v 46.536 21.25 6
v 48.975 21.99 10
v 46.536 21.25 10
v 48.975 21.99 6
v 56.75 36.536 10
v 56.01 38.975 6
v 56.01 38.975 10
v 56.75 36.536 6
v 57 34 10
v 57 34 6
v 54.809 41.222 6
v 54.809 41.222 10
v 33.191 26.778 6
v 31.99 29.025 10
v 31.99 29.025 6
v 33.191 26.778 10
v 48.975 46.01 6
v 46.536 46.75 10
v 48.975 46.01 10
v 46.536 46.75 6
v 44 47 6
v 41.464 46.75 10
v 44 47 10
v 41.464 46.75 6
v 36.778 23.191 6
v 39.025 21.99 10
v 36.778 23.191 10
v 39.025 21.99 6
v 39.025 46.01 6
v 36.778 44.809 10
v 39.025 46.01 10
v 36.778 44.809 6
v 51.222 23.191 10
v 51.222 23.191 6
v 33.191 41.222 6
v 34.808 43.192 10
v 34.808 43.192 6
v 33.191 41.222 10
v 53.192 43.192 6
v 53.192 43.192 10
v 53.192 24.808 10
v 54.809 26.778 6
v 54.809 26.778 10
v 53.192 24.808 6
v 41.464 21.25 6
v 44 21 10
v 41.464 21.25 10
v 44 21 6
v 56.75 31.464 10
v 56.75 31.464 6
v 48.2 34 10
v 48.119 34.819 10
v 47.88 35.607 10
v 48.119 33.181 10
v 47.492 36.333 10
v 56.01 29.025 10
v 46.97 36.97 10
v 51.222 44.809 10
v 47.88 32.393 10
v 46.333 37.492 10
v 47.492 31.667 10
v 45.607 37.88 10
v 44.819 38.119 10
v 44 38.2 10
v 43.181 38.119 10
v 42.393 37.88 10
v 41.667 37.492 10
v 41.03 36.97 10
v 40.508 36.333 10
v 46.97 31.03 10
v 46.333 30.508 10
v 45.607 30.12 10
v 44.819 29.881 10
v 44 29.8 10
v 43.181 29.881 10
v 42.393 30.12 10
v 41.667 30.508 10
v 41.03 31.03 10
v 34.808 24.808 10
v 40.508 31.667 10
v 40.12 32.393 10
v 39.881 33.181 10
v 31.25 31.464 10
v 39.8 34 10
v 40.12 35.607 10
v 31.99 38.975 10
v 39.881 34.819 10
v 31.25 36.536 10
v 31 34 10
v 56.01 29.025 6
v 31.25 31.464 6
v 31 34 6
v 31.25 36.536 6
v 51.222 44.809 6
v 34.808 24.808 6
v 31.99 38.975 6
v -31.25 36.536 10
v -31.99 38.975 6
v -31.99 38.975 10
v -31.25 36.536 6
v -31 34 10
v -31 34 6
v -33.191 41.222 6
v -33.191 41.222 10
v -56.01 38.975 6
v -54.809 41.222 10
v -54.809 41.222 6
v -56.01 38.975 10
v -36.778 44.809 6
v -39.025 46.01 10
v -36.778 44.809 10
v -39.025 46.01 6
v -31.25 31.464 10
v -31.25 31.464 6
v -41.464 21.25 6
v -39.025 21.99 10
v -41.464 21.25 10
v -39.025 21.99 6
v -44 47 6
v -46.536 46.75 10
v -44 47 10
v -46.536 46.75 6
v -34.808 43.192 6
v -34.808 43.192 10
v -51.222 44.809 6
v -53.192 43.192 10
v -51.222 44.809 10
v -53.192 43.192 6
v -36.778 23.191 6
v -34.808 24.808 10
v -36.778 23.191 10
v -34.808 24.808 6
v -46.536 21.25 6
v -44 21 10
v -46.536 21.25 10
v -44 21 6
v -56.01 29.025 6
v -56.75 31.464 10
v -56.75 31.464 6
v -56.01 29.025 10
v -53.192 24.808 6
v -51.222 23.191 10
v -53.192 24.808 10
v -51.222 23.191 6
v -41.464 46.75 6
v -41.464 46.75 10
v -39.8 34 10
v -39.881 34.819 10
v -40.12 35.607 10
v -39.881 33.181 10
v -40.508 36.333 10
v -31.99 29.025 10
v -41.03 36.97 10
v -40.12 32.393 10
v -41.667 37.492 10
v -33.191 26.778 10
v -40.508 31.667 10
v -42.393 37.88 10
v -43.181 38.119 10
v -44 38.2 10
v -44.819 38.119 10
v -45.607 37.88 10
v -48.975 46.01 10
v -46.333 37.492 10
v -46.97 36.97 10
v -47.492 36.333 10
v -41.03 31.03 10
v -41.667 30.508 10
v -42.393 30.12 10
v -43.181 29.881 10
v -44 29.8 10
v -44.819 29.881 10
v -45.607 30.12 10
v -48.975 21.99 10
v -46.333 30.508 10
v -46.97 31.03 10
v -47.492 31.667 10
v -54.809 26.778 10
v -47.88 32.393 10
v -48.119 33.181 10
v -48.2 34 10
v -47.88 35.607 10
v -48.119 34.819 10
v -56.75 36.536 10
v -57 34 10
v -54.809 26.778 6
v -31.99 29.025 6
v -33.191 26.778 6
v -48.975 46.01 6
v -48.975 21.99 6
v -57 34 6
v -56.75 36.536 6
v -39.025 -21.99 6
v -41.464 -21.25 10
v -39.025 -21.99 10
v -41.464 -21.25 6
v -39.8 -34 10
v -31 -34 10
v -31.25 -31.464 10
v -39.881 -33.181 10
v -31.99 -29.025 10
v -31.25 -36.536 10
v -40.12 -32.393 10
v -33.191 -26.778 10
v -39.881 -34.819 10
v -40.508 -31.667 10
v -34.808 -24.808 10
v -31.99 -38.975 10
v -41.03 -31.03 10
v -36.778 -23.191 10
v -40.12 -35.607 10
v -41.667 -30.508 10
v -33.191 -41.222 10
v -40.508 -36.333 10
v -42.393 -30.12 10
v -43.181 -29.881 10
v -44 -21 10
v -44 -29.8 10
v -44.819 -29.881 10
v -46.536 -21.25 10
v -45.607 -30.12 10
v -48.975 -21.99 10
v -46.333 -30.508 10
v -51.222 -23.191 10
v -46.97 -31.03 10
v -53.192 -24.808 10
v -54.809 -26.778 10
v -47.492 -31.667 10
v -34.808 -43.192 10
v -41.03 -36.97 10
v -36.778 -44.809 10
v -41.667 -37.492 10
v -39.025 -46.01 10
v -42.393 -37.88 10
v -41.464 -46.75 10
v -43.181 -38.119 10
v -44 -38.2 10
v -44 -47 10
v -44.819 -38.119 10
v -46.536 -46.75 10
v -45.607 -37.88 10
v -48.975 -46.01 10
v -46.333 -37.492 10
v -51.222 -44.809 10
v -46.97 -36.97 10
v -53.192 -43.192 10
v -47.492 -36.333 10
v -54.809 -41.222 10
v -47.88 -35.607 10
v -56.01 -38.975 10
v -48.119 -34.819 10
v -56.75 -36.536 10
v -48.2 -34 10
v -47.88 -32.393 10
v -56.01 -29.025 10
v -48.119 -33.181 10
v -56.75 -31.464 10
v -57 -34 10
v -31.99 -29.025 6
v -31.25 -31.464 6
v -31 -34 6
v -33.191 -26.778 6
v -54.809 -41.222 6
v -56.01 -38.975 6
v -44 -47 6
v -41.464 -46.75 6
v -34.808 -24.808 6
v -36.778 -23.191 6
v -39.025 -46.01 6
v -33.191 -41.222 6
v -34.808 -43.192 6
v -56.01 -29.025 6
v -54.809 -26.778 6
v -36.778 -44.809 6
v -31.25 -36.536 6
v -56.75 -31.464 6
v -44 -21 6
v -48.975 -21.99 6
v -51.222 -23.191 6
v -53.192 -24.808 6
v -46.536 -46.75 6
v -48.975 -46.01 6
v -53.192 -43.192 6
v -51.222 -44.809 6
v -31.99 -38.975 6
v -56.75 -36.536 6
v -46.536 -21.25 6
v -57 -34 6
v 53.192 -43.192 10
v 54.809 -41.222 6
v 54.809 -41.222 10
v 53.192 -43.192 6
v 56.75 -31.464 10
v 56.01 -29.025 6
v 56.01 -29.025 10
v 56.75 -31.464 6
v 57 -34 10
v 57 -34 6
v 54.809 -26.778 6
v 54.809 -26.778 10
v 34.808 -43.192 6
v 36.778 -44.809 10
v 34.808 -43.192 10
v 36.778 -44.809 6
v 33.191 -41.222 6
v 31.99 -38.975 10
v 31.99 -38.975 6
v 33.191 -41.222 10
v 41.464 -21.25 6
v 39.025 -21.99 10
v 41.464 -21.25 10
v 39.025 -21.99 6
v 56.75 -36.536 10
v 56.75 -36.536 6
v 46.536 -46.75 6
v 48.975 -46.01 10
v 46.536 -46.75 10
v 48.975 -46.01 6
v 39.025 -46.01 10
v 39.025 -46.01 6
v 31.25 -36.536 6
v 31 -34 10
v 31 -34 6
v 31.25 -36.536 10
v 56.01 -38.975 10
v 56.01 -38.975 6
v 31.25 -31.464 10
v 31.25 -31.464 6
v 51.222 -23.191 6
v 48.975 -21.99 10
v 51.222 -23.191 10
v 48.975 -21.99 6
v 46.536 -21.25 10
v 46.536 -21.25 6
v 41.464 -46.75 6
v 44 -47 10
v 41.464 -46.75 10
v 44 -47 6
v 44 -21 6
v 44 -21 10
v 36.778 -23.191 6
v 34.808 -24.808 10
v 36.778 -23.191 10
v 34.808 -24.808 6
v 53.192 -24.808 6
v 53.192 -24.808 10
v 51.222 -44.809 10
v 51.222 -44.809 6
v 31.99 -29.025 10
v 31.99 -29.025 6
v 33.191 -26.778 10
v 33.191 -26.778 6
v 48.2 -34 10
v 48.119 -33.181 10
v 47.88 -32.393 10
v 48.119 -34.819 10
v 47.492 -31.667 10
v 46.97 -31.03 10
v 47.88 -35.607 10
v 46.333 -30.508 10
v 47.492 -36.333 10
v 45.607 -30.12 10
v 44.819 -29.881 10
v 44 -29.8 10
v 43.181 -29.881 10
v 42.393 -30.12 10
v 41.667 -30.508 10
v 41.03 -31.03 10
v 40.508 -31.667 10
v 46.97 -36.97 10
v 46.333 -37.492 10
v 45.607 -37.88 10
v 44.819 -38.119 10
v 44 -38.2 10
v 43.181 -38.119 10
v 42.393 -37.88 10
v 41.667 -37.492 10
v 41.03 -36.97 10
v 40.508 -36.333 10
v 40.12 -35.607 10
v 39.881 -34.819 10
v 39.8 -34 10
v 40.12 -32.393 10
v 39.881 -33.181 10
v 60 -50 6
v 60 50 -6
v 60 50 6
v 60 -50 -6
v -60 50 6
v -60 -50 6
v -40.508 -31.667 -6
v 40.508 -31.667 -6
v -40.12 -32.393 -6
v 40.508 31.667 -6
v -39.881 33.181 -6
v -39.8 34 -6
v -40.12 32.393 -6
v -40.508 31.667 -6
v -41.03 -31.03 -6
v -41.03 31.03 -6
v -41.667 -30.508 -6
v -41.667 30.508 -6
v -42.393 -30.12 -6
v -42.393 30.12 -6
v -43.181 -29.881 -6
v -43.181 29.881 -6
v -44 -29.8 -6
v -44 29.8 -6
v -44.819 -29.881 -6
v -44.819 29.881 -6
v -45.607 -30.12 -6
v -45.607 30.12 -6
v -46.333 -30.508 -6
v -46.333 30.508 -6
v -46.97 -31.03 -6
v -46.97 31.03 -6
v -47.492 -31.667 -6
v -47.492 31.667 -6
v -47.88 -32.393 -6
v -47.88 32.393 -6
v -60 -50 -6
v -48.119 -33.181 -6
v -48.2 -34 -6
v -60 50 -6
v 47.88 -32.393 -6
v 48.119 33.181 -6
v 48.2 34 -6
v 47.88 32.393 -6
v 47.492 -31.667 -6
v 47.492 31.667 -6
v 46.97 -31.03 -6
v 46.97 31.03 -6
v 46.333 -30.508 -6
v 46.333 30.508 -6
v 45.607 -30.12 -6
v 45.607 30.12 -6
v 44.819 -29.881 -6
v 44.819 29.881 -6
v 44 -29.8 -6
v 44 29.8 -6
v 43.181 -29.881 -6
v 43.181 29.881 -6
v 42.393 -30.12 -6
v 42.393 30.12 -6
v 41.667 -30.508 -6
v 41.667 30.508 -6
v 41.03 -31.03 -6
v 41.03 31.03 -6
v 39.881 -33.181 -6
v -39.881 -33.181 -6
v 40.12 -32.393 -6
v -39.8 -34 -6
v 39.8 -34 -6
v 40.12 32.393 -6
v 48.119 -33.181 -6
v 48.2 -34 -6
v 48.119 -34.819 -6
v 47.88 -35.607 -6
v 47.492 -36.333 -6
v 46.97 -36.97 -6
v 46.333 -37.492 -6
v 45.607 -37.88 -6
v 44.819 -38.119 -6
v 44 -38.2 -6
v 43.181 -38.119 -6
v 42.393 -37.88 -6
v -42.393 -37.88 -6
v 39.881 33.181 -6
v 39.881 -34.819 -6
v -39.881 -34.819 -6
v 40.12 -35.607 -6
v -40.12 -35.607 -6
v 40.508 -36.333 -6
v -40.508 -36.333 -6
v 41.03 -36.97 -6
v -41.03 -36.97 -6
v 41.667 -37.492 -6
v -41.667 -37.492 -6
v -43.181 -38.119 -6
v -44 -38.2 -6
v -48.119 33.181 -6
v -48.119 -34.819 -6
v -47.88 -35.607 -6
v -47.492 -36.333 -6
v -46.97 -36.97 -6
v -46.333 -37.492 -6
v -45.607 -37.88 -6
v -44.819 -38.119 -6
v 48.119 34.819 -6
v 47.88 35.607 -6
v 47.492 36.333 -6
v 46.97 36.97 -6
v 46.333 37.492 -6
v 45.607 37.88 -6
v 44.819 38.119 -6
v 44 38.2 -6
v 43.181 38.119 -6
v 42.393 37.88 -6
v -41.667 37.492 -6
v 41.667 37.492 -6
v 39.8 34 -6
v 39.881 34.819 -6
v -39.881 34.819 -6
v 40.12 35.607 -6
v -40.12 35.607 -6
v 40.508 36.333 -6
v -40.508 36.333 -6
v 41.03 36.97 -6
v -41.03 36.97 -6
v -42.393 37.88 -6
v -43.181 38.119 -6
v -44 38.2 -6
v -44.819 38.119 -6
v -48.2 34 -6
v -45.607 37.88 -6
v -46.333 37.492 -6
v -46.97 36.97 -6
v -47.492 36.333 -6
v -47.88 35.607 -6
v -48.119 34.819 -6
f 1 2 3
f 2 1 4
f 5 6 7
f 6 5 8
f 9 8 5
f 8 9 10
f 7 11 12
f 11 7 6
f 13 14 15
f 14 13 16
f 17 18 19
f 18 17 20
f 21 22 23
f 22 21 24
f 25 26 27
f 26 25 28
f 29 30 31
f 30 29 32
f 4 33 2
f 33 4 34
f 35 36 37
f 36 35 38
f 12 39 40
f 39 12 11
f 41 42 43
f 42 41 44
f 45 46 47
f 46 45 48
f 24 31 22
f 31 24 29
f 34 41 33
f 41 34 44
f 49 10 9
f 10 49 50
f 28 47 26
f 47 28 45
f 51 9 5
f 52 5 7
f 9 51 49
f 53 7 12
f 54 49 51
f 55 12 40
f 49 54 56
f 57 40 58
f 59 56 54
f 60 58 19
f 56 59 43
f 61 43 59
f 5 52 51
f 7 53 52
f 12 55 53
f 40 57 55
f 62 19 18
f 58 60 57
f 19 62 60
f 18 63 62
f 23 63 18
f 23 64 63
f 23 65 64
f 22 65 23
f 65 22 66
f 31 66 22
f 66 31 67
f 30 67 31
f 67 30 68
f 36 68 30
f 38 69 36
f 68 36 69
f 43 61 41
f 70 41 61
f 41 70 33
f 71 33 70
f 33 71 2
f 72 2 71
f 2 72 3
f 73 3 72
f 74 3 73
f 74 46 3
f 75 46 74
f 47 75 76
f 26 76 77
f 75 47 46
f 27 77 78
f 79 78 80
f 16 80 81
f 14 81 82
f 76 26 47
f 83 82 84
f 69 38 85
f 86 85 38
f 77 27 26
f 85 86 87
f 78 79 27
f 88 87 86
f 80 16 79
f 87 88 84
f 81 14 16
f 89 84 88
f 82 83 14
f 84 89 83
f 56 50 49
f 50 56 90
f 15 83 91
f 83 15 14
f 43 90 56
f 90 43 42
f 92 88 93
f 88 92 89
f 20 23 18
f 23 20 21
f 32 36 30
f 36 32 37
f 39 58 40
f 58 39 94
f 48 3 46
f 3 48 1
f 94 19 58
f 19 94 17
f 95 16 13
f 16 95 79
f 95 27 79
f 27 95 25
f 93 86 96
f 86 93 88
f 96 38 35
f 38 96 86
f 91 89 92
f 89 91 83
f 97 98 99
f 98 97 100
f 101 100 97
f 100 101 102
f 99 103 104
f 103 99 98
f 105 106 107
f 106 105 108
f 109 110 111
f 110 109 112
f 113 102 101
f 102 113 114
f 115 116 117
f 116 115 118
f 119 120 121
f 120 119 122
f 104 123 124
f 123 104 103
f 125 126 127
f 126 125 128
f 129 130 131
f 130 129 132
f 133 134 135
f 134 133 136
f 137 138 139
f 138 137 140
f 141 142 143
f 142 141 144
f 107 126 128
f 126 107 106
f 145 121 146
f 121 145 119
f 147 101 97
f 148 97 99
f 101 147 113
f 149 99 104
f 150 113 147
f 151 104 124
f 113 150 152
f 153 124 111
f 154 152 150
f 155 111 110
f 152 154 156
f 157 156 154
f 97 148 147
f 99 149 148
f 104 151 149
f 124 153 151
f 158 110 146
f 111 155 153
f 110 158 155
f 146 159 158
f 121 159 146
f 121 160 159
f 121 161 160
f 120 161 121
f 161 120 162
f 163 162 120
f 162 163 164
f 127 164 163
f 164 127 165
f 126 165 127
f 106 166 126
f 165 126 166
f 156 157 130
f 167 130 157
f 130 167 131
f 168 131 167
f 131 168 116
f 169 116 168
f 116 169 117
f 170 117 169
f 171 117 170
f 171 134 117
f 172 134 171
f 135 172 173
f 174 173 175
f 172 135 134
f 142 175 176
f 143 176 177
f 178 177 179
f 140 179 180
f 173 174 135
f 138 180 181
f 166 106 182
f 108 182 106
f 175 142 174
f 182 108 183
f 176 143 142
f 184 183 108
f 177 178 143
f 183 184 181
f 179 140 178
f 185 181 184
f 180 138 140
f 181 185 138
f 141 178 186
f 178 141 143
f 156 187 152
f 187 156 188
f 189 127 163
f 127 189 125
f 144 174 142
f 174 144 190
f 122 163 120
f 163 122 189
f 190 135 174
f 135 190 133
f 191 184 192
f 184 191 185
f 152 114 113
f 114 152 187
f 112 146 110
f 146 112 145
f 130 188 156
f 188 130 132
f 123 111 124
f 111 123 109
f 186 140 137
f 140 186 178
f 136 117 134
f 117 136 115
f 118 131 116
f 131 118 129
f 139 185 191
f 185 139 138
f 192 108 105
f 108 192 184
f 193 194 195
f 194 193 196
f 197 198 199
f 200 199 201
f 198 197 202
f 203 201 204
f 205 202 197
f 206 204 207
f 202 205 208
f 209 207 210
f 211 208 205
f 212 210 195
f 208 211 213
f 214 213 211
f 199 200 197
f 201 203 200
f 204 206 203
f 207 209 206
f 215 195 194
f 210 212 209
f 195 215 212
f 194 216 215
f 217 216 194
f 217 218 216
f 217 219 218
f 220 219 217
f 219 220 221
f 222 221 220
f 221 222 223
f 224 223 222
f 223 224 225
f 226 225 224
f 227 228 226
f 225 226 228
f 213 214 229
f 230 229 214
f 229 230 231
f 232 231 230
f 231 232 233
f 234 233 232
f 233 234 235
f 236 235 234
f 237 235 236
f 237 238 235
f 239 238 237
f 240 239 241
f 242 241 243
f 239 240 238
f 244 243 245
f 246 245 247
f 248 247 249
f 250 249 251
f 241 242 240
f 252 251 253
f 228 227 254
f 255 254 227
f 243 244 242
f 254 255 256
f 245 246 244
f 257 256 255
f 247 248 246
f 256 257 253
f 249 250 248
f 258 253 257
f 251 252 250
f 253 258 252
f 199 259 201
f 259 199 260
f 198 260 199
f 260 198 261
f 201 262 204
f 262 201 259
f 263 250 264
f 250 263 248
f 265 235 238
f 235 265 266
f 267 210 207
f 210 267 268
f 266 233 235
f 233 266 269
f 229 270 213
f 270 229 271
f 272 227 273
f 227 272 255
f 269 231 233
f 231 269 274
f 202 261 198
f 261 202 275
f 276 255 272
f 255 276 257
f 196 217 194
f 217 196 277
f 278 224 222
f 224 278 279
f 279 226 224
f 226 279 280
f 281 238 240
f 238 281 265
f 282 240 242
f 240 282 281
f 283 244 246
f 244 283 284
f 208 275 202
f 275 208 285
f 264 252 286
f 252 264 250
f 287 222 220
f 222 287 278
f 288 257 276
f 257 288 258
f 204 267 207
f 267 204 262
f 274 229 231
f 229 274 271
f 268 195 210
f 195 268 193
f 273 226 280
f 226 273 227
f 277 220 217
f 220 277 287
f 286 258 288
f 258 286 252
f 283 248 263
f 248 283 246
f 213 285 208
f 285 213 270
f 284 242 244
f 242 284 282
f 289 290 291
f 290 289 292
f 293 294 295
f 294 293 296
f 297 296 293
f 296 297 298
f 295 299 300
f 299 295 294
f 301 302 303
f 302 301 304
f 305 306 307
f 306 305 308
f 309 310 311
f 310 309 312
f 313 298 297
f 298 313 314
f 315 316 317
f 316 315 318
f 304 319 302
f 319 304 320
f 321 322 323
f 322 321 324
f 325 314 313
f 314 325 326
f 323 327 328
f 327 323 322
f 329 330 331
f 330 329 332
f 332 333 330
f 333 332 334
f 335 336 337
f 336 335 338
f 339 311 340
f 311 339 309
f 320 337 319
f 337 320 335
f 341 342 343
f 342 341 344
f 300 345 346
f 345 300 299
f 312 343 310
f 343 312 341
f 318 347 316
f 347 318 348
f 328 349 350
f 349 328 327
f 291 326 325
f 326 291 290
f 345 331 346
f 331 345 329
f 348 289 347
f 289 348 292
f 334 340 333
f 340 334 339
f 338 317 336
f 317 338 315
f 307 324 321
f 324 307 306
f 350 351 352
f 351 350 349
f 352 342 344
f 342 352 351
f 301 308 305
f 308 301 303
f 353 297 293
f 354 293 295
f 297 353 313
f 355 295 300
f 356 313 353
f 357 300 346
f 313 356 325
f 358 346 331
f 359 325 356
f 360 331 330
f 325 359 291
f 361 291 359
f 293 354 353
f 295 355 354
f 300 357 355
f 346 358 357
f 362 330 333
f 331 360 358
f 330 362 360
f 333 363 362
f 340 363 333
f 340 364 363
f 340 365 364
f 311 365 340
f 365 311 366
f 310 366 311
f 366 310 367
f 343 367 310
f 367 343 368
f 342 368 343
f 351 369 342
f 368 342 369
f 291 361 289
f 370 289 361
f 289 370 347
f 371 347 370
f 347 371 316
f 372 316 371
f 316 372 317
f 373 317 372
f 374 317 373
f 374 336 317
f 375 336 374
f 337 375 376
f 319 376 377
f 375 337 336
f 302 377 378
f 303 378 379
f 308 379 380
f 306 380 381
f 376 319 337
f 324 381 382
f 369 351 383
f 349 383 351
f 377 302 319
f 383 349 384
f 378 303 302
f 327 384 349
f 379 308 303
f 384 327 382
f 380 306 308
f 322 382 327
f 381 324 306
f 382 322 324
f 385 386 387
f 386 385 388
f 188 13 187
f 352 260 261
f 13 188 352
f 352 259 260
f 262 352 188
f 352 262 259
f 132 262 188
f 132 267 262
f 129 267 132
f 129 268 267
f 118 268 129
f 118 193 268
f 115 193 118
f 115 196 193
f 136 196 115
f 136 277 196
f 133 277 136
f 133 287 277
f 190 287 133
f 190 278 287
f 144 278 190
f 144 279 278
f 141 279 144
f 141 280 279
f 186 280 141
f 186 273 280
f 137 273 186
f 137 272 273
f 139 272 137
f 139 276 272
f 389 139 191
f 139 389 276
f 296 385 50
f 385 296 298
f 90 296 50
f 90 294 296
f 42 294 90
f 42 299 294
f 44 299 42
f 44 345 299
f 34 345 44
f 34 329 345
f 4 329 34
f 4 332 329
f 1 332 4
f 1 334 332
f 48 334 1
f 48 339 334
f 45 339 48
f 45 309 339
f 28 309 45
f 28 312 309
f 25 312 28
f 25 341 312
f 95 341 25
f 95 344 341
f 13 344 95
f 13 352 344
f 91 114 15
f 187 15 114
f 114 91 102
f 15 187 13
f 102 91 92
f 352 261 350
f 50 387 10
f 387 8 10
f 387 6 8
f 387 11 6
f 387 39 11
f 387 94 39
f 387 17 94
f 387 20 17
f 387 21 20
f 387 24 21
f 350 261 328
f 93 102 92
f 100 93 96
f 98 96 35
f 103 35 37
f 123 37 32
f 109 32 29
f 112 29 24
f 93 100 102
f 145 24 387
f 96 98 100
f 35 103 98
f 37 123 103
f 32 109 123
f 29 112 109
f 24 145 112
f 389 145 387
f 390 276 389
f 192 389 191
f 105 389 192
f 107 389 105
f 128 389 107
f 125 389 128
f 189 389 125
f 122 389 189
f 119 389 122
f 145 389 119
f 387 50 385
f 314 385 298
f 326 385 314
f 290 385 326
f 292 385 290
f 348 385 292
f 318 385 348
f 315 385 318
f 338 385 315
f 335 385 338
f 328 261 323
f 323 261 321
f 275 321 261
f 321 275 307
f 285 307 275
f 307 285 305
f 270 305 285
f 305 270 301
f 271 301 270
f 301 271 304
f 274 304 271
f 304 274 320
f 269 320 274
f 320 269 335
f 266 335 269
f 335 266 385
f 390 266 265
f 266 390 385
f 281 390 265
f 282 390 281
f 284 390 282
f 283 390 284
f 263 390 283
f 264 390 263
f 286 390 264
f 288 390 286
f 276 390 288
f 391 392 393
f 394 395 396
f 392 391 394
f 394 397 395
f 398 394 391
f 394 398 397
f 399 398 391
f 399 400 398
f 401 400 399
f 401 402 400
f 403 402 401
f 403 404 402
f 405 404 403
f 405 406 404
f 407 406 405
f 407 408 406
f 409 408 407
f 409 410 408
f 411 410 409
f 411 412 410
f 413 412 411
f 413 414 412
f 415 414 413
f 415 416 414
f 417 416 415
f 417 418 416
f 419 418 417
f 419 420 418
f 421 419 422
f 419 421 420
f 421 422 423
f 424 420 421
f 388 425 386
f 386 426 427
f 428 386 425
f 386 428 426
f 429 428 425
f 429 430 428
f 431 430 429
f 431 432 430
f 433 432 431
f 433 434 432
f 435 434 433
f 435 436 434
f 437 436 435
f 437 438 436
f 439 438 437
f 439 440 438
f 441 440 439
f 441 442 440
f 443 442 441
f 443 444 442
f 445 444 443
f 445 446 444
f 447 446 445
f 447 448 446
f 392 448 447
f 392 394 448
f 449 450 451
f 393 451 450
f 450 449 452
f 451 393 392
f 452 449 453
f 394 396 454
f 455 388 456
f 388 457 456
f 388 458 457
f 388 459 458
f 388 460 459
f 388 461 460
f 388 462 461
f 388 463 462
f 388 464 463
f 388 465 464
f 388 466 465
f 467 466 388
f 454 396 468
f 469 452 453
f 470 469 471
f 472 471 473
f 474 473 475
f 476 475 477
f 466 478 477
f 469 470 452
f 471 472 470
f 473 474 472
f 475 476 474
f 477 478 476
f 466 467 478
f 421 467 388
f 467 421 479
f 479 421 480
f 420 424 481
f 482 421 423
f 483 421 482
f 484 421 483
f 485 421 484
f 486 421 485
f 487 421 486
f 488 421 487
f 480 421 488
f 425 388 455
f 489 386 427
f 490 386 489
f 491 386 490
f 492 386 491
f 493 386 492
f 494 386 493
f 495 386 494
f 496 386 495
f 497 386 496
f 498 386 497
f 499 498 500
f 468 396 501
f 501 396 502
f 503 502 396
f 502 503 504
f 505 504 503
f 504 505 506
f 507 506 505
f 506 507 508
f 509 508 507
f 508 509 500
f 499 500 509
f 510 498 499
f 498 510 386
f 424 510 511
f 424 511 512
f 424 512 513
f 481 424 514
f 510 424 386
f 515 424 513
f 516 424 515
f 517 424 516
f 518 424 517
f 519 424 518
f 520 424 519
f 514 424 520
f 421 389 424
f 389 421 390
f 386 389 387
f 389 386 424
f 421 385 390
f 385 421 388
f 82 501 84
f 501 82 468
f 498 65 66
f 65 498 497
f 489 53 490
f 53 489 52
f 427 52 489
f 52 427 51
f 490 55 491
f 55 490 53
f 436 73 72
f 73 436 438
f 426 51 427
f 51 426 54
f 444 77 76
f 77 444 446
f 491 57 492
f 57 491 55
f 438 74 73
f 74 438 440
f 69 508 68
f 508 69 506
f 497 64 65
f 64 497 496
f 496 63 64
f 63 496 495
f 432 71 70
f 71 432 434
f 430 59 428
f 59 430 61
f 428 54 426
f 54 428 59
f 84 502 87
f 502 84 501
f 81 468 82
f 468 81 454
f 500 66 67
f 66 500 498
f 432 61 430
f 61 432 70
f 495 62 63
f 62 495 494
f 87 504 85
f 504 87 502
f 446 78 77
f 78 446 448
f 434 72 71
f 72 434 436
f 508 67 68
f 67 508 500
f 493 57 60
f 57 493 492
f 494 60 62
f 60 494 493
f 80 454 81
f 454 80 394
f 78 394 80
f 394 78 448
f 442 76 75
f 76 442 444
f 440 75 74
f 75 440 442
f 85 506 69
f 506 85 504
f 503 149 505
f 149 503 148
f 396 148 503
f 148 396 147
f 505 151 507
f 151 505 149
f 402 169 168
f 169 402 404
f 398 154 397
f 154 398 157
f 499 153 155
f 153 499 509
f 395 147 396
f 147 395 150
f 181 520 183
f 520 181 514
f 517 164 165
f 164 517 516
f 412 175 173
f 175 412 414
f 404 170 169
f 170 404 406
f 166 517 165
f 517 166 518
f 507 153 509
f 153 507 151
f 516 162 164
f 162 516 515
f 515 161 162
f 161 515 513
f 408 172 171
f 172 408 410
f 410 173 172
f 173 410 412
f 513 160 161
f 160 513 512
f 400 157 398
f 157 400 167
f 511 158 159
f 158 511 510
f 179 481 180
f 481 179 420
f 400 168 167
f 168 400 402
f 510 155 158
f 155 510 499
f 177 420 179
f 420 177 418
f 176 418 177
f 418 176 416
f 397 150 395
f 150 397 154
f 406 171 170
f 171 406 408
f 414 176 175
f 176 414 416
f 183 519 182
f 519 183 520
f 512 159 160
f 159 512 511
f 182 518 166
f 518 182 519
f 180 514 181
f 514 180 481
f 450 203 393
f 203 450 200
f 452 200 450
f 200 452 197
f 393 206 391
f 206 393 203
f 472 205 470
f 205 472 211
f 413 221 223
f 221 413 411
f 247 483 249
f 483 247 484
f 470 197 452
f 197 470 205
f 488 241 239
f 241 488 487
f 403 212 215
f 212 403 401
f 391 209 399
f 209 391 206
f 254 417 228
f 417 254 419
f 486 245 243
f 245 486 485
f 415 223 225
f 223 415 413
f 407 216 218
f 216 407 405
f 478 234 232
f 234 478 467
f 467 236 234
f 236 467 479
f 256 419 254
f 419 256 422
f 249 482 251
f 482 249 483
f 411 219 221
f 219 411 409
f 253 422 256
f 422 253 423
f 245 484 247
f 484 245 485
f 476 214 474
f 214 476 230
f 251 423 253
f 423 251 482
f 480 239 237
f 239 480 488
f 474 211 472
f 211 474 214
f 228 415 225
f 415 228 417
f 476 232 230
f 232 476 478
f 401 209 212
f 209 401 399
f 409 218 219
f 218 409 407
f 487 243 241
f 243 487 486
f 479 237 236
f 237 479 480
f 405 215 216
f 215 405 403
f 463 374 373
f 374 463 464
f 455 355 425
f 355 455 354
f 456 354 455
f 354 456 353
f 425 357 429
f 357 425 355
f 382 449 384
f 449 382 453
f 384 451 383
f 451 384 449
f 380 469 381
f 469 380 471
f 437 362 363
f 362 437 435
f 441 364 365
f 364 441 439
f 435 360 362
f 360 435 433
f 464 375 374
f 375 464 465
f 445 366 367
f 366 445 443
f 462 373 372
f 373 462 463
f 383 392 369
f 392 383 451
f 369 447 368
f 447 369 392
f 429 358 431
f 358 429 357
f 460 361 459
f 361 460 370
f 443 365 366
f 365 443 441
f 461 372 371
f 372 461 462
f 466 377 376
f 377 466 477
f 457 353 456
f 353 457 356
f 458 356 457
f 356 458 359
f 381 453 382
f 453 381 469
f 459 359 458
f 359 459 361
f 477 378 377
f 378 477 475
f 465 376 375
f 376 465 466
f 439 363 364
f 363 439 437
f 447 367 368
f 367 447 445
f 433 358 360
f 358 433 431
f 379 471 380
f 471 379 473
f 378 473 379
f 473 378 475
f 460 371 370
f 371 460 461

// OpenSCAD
$fn = 32;

// ----------------------------------------------------------------------
// Anchor pads 120 x 100 x 16
// four corner bosses with anchor holes
// ----------------------------------------------------------------------

// --- parameters (mm) ---
plate = [120, 100, 12];  // base plate size (x, y, z)
pads = 4;                // boss count, one per corner
edge = 16;               // boss centre offset from the plate edge
boss_d = 26;             // boss diameter
boss_h = 4;              // boss height above the base plate
hole_d = 8.4;            // hole diameter

// --- derived feature positions (mm) ---
height = plate[2] + boss_h;      // = 16   overall height of the part
corner_x = plate[0] / 2 - edge;  // = 44   boss centre X
corner_y = plate[1] / 2 - edge;  // = 34   boss centre Y
feature_centers = [
  [corner_x, corner_y],
  [-corner_x, corner_y],
  [-corner_x, -corner_y],
  [corner_x, -corner_y]
];   // boss centres, anchor holes are drilled there

// base plate, four bosses standing on it, anchor holes all the way through
difference() {
  union() {
    cube(plate, center = true);
    for (centre = feature_centers)
      translate([centre[0], centre[1], plate[2] / 2 - 1])
        cylinder(d = boss_d, h = boss_h + 1);
  }
  for (centre = feature_centers)
    translate([centre[0], centre[1], -height])
      cylinder(d = hole_d, h = 2 * height + 2);  // through boss and plate
}
